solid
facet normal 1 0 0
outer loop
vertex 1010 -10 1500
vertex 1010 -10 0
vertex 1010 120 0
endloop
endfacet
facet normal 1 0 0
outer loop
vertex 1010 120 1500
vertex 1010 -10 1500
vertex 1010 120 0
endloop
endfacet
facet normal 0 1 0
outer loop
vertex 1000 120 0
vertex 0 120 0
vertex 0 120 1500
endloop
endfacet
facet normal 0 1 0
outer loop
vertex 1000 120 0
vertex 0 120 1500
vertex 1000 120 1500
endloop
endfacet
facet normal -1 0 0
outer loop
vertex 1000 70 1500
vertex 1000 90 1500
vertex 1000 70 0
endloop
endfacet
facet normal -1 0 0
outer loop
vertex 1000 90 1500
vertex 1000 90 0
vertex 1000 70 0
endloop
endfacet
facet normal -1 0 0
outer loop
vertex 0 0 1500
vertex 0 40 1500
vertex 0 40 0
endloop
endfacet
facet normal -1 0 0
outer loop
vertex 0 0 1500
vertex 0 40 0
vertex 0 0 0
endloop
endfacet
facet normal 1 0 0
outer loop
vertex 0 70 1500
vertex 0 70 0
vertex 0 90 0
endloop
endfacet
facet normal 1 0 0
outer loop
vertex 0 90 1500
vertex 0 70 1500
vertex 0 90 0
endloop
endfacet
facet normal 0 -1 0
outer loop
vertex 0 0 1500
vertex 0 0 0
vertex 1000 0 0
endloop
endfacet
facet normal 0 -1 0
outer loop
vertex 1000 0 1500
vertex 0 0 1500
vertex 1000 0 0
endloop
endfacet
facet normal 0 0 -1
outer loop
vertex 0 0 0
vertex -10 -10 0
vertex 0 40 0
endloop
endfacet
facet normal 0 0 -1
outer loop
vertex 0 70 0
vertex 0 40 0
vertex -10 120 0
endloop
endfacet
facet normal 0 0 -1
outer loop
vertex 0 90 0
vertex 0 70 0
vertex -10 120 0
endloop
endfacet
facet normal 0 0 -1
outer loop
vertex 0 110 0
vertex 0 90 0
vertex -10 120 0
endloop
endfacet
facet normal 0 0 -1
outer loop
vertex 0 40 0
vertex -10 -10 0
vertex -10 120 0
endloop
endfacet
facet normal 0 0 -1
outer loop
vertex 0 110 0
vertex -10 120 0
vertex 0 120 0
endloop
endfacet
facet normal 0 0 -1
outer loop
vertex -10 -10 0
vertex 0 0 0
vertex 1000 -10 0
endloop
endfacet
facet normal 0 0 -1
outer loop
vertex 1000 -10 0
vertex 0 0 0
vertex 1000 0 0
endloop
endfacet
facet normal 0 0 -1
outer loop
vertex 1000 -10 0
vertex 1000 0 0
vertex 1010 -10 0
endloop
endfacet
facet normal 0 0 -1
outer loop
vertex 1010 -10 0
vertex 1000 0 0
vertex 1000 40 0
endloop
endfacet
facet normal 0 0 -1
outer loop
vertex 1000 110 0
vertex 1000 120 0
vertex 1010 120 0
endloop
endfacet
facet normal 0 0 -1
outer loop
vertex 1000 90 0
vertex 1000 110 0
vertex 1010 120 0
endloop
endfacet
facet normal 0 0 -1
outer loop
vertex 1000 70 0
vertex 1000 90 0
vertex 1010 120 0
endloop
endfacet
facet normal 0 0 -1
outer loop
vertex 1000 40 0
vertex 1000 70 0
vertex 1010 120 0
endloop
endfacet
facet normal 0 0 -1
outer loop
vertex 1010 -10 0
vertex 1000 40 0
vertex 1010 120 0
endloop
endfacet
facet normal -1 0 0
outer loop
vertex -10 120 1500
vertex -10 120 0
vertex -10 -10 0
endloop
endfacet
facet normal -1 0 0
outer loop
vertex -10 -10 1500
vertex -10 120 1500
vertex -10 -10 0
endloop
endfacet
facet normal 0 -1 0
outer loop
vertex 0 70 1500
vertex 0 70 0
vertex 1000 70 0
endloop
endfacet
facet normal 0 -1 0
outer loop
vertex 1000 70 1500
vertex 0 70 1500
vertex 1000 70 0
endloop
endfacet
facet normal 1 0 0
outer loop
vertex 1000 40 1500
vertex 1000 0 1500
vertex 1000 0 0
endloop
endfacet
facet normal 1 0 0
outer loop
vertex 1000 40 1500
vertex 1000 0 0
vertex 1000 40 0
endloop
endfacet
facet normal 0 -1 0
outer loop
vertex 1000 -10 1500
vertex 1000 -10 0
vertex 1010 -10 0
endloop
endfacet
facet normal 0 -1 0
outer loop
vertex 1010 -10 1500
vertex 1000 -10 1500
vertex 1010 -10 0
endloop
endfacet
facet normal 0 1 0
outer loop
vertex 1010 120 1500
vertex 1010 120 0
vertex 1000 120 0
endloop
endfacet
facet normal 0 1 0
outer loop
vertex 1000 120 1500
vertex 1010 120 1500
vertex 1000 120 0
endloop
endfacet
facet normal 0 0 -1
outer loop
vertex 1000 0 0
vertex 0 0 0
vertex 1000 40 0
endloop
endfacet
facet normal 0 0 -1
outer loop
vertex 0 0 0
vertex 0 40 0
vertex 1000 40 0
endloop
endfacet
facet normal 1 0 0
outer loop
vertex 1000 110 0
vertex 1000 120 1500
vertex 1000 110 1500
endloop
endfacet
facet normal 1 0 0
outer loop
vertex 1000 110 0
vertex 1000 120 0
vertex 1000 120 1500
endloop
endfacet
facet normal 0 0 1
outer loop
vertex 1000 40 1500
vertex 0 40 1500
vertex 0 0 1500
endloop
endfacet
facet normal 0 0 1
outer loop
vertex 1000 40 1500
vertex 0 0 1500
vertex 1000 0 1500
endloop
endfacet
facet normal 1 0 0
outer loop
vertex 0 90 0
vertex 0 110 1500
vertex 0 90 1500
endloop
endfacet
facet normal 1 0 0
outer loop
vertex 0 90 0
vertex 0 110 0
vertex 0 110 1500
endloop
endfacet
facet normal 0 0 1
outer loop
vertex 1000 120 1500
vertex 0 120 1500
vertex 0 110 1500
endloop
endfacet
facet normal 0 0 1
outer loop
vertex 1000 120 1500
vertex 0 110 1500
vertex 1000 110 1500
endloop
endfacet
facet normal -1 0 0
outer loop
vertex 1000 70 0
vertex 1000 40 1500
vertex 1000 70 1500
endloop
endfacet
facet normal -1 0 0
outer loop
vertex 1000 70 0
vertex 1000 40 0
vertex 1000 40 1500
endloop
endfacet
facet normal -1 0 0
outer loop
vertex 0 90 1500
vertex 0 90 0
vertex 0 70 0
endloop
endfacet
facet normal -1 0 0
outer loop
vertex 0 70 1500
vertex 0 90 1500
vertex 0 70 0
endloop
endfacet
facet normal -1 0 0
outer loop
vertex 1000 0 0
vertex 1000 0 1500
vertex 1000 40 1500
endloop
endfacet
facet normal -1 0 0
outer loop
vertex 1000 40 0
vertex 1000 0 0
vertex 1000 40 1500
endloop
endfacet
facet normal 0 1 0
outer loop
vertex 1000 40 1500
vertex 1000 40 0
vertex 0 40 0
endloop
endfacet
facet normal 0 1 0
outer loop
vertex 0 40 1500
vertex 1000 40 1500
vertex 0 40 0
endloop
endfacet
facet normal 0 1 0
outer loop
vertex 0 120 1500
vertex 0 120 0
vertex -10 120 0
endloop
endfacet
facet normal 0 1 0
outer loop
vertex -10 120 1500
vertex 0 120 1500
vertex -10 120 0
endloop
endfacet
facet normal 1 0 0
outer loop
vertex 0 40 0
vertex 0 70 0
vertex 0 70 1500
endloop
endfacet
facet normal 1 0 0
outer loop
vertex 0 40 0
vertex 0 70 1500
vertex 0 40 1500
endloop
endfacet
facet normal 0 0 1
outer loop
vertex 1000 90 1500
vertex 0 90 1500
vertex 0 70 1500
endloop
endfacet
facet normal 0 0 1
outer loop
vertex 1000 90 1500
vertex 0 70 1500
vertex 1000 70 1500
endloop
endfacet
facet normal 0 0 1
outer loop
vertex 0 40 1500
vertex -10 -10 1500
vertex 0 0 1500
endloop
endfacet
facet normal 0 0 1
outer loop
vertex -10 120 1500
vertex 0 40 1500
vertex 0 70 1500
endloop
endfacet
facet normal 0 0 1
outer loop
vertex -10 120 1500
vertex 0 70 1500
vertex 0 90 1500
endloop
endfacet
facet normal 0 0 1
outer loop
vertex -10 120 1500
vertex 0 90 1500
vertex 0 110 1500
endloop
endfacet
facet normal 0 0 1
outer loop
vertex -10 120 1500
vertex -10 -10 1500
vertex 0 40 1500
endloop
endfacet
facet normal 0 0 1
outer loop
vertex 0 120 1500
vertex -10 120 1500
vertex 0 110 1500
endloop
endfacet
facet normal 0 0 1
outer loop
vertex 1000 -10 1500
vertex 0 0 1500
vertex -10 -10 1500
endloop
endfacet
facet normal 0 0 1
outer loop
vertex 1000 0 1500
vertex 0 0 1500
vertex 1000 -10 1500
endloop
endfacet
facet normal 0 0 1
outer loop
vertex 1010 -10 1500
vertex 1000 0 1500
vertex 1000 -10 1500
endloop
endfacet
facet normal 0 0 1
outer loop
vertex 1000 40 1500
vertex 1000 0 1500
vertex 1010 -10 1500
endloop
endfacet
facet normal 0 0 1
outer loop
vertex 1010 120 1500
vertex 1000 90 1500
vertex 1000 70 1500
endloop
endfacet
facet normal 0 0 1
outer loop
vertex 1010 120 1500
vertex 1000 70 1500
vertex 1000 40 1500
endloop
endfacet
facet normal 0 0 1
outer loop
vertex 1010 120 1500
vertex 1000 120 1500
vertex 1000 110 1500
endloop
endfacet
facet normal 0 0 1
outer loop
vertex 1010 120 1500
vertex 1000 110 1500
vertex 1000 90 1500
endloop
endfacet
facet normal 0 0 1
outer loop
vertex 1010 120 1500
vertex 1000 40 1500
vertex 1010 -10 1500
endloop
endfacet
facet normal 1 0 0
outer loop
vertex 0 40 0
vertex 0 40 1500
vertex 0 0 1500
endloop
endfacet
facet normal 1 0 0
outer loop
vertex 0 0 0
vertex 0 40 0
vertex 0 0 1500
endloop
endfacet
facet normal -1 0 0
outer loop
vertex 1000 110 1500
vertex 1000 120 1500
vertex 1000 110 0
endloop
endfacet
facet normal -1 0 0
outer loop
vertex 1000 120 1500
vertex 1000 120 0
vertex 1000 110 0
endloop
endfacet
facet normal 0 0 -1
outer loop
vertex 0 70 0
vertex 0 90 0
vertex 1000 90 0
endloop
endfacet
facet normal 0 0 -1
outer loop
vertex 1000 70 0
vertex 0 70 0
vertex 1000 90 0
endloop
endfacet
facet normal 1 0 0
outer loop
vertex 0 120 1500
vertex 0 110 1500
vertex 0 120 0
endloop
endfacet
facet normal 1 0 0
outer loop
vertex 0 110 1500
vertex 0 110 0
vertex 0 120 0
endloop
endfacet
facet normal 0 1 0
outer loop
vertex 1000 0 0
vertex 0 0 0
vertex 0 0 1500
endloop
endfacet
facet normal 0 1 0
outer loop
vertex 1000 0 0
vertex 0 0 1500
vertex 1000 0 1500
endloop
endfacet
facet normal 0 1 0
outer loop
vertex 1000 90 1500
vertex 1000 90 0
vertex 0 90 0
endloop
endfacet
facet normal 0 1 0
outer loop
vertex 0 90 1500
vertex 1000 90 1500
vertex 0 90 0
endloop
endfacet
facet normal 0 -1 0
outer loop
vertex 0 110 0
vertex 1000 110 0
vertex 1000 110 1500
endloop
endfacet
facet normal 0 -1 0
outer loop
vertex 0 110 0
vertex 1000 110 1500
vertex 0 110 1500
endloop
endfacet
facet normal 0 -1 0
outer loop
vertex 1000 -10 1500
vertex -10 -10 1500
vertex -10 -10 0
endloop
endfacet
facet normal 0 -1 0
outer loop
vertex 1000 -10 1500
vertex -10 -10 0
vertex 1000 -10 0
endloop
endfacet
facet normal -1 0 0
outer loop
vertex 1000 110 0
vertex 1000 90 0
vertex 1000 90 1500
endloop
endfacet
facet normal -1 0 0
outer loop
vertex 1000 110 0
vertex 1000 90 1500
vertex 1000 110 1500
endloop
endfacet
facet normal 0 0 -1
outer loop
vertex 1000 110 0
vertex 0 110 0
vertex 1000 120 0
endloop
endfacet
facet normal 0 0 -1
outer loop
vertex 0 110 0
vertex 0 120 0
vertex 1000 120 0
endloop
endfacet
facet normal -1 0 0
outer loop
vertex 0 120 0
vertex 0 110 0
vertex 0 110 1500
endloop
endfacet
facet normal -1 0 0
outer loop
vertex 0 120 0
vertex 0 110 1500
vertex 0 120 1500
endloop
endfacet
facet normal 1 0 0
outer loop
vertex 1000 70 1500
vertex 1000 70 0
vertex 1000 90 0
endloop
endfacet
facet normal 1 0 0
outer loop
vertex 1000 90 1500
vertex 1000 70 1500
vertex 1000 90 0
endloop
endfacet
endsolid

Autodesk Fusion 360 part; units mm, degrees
sketch "Sketch1" plane through (0, 0, 0) normal (0, 0, 1) x (1, 0, 0)
  line L0 (0, 0) -> (1000, 0)
  line L1 (1000, 0) -> (1000, 40)
  line L2 (1000, 40) -> (0, 40)
  line L3 (0, 40) -> (0, 0)
  line L4 (0, 90) -> (1000, 90)
  line L5 (1000, 90) -> (1000, 70)
  line L6 (1000, 70) -> (0, 70)
  line L7 (0, 70) -> (0, 90)
  line L8 (0, 120) -> (1000, 120)
  line L9 (1000, 120) -> (1000, 110)
  line L10 (1000, 110) -> (0, 110)
  line L11 (0, 110) -> (0, 120)
  line L12 (0, 120) -> (-10, 120)
  line L13 (-10, 120) -> (-10, -10)
  line L14 (-10, -10) -> (1000, -10)
  line L15 (1000, -10) -> (1010, -10)
  line L16 (1010, -10) -> (1010, 120)
  line L17 (1010, 120) -> (1000, 120)
  line L18 (1000, 0) -> (1000, 120)
  line L19 (0, 120) -> (0, 0)
  dimension "d1" = 1000
  dimension "d2" = 40
  dimension "d3" = 1000
  dimension "d4" = 20
  dimension "d5" = 1000
  dimension "d6" = 10
  dimension "d7" = 10
  dimension "d8" = 1010
sketch "Sketch2" plane through (0, 0, 0) normal (0, 0, 1) x (1, 0, 0)
  line L0 (0, 0) -> (1000, 0)
  line L1 (1000, 0) -> (1000, 40)
  line L2 (1000, 40) -> (0, 40)
  line L3 (0, 40) -> (0, 0)
  dimension "d11" = 1000
  dimension "d12" = 40
sketch "Sketch3" plane through (0, 0, 0) normal (0, 0, 1) x (1, 0, 0)
  line L0 (0, 70) -> (1000, 70)
  line L1 (1000, 70) -> (1000, 90)
  line L2 (1000, 90) -> (0, 90)
  line L3 (0, 90) -> (0, 70)
  dimension "d15" = 1000
  dimension "d16" = 20
sketch "Sketch4" plane through (0, 0, 1400) normal (0, 0, 1) x (1, 0, 0)
  line L0 (0, 40) -> (0, 0)
  line L1 (0, 0) -> (1000, 0)
  line L2 (1000, 0) -> (1000, 40)
  line L3 (1000, 40) -> (0, 40)
  line L4 (0, 120) -> (1000, 120)
  line L5 (1000, 120) -> (1000, 110)
  line L6 (1000, 110) -> (0, 110)
  line L7 (0, 110) -> (0, 120)
  dimension "d19" = 1000
  dimension "d20" = 10
extrude "Extrude5" add sketch "Sketch1" along normal blind 1500 contours L0 L1 L3 L5 L7 L9 L11 L12 L13 L14 L15 L16 L17 L18 L19 makes body 1
extrude "Extrude6" add sketch "Sketch2" along normal blind 1500 separate body makes body 2
extrude "Extrude7" add sketch "Sketch3" along normal blind 1500 separate body makes body 3
extrude "Extrude8" add sketch "Sketch4" along normal blind 100 and the other way blind 1400 separate body contours L4 L5 L6 L7 makes body 4
